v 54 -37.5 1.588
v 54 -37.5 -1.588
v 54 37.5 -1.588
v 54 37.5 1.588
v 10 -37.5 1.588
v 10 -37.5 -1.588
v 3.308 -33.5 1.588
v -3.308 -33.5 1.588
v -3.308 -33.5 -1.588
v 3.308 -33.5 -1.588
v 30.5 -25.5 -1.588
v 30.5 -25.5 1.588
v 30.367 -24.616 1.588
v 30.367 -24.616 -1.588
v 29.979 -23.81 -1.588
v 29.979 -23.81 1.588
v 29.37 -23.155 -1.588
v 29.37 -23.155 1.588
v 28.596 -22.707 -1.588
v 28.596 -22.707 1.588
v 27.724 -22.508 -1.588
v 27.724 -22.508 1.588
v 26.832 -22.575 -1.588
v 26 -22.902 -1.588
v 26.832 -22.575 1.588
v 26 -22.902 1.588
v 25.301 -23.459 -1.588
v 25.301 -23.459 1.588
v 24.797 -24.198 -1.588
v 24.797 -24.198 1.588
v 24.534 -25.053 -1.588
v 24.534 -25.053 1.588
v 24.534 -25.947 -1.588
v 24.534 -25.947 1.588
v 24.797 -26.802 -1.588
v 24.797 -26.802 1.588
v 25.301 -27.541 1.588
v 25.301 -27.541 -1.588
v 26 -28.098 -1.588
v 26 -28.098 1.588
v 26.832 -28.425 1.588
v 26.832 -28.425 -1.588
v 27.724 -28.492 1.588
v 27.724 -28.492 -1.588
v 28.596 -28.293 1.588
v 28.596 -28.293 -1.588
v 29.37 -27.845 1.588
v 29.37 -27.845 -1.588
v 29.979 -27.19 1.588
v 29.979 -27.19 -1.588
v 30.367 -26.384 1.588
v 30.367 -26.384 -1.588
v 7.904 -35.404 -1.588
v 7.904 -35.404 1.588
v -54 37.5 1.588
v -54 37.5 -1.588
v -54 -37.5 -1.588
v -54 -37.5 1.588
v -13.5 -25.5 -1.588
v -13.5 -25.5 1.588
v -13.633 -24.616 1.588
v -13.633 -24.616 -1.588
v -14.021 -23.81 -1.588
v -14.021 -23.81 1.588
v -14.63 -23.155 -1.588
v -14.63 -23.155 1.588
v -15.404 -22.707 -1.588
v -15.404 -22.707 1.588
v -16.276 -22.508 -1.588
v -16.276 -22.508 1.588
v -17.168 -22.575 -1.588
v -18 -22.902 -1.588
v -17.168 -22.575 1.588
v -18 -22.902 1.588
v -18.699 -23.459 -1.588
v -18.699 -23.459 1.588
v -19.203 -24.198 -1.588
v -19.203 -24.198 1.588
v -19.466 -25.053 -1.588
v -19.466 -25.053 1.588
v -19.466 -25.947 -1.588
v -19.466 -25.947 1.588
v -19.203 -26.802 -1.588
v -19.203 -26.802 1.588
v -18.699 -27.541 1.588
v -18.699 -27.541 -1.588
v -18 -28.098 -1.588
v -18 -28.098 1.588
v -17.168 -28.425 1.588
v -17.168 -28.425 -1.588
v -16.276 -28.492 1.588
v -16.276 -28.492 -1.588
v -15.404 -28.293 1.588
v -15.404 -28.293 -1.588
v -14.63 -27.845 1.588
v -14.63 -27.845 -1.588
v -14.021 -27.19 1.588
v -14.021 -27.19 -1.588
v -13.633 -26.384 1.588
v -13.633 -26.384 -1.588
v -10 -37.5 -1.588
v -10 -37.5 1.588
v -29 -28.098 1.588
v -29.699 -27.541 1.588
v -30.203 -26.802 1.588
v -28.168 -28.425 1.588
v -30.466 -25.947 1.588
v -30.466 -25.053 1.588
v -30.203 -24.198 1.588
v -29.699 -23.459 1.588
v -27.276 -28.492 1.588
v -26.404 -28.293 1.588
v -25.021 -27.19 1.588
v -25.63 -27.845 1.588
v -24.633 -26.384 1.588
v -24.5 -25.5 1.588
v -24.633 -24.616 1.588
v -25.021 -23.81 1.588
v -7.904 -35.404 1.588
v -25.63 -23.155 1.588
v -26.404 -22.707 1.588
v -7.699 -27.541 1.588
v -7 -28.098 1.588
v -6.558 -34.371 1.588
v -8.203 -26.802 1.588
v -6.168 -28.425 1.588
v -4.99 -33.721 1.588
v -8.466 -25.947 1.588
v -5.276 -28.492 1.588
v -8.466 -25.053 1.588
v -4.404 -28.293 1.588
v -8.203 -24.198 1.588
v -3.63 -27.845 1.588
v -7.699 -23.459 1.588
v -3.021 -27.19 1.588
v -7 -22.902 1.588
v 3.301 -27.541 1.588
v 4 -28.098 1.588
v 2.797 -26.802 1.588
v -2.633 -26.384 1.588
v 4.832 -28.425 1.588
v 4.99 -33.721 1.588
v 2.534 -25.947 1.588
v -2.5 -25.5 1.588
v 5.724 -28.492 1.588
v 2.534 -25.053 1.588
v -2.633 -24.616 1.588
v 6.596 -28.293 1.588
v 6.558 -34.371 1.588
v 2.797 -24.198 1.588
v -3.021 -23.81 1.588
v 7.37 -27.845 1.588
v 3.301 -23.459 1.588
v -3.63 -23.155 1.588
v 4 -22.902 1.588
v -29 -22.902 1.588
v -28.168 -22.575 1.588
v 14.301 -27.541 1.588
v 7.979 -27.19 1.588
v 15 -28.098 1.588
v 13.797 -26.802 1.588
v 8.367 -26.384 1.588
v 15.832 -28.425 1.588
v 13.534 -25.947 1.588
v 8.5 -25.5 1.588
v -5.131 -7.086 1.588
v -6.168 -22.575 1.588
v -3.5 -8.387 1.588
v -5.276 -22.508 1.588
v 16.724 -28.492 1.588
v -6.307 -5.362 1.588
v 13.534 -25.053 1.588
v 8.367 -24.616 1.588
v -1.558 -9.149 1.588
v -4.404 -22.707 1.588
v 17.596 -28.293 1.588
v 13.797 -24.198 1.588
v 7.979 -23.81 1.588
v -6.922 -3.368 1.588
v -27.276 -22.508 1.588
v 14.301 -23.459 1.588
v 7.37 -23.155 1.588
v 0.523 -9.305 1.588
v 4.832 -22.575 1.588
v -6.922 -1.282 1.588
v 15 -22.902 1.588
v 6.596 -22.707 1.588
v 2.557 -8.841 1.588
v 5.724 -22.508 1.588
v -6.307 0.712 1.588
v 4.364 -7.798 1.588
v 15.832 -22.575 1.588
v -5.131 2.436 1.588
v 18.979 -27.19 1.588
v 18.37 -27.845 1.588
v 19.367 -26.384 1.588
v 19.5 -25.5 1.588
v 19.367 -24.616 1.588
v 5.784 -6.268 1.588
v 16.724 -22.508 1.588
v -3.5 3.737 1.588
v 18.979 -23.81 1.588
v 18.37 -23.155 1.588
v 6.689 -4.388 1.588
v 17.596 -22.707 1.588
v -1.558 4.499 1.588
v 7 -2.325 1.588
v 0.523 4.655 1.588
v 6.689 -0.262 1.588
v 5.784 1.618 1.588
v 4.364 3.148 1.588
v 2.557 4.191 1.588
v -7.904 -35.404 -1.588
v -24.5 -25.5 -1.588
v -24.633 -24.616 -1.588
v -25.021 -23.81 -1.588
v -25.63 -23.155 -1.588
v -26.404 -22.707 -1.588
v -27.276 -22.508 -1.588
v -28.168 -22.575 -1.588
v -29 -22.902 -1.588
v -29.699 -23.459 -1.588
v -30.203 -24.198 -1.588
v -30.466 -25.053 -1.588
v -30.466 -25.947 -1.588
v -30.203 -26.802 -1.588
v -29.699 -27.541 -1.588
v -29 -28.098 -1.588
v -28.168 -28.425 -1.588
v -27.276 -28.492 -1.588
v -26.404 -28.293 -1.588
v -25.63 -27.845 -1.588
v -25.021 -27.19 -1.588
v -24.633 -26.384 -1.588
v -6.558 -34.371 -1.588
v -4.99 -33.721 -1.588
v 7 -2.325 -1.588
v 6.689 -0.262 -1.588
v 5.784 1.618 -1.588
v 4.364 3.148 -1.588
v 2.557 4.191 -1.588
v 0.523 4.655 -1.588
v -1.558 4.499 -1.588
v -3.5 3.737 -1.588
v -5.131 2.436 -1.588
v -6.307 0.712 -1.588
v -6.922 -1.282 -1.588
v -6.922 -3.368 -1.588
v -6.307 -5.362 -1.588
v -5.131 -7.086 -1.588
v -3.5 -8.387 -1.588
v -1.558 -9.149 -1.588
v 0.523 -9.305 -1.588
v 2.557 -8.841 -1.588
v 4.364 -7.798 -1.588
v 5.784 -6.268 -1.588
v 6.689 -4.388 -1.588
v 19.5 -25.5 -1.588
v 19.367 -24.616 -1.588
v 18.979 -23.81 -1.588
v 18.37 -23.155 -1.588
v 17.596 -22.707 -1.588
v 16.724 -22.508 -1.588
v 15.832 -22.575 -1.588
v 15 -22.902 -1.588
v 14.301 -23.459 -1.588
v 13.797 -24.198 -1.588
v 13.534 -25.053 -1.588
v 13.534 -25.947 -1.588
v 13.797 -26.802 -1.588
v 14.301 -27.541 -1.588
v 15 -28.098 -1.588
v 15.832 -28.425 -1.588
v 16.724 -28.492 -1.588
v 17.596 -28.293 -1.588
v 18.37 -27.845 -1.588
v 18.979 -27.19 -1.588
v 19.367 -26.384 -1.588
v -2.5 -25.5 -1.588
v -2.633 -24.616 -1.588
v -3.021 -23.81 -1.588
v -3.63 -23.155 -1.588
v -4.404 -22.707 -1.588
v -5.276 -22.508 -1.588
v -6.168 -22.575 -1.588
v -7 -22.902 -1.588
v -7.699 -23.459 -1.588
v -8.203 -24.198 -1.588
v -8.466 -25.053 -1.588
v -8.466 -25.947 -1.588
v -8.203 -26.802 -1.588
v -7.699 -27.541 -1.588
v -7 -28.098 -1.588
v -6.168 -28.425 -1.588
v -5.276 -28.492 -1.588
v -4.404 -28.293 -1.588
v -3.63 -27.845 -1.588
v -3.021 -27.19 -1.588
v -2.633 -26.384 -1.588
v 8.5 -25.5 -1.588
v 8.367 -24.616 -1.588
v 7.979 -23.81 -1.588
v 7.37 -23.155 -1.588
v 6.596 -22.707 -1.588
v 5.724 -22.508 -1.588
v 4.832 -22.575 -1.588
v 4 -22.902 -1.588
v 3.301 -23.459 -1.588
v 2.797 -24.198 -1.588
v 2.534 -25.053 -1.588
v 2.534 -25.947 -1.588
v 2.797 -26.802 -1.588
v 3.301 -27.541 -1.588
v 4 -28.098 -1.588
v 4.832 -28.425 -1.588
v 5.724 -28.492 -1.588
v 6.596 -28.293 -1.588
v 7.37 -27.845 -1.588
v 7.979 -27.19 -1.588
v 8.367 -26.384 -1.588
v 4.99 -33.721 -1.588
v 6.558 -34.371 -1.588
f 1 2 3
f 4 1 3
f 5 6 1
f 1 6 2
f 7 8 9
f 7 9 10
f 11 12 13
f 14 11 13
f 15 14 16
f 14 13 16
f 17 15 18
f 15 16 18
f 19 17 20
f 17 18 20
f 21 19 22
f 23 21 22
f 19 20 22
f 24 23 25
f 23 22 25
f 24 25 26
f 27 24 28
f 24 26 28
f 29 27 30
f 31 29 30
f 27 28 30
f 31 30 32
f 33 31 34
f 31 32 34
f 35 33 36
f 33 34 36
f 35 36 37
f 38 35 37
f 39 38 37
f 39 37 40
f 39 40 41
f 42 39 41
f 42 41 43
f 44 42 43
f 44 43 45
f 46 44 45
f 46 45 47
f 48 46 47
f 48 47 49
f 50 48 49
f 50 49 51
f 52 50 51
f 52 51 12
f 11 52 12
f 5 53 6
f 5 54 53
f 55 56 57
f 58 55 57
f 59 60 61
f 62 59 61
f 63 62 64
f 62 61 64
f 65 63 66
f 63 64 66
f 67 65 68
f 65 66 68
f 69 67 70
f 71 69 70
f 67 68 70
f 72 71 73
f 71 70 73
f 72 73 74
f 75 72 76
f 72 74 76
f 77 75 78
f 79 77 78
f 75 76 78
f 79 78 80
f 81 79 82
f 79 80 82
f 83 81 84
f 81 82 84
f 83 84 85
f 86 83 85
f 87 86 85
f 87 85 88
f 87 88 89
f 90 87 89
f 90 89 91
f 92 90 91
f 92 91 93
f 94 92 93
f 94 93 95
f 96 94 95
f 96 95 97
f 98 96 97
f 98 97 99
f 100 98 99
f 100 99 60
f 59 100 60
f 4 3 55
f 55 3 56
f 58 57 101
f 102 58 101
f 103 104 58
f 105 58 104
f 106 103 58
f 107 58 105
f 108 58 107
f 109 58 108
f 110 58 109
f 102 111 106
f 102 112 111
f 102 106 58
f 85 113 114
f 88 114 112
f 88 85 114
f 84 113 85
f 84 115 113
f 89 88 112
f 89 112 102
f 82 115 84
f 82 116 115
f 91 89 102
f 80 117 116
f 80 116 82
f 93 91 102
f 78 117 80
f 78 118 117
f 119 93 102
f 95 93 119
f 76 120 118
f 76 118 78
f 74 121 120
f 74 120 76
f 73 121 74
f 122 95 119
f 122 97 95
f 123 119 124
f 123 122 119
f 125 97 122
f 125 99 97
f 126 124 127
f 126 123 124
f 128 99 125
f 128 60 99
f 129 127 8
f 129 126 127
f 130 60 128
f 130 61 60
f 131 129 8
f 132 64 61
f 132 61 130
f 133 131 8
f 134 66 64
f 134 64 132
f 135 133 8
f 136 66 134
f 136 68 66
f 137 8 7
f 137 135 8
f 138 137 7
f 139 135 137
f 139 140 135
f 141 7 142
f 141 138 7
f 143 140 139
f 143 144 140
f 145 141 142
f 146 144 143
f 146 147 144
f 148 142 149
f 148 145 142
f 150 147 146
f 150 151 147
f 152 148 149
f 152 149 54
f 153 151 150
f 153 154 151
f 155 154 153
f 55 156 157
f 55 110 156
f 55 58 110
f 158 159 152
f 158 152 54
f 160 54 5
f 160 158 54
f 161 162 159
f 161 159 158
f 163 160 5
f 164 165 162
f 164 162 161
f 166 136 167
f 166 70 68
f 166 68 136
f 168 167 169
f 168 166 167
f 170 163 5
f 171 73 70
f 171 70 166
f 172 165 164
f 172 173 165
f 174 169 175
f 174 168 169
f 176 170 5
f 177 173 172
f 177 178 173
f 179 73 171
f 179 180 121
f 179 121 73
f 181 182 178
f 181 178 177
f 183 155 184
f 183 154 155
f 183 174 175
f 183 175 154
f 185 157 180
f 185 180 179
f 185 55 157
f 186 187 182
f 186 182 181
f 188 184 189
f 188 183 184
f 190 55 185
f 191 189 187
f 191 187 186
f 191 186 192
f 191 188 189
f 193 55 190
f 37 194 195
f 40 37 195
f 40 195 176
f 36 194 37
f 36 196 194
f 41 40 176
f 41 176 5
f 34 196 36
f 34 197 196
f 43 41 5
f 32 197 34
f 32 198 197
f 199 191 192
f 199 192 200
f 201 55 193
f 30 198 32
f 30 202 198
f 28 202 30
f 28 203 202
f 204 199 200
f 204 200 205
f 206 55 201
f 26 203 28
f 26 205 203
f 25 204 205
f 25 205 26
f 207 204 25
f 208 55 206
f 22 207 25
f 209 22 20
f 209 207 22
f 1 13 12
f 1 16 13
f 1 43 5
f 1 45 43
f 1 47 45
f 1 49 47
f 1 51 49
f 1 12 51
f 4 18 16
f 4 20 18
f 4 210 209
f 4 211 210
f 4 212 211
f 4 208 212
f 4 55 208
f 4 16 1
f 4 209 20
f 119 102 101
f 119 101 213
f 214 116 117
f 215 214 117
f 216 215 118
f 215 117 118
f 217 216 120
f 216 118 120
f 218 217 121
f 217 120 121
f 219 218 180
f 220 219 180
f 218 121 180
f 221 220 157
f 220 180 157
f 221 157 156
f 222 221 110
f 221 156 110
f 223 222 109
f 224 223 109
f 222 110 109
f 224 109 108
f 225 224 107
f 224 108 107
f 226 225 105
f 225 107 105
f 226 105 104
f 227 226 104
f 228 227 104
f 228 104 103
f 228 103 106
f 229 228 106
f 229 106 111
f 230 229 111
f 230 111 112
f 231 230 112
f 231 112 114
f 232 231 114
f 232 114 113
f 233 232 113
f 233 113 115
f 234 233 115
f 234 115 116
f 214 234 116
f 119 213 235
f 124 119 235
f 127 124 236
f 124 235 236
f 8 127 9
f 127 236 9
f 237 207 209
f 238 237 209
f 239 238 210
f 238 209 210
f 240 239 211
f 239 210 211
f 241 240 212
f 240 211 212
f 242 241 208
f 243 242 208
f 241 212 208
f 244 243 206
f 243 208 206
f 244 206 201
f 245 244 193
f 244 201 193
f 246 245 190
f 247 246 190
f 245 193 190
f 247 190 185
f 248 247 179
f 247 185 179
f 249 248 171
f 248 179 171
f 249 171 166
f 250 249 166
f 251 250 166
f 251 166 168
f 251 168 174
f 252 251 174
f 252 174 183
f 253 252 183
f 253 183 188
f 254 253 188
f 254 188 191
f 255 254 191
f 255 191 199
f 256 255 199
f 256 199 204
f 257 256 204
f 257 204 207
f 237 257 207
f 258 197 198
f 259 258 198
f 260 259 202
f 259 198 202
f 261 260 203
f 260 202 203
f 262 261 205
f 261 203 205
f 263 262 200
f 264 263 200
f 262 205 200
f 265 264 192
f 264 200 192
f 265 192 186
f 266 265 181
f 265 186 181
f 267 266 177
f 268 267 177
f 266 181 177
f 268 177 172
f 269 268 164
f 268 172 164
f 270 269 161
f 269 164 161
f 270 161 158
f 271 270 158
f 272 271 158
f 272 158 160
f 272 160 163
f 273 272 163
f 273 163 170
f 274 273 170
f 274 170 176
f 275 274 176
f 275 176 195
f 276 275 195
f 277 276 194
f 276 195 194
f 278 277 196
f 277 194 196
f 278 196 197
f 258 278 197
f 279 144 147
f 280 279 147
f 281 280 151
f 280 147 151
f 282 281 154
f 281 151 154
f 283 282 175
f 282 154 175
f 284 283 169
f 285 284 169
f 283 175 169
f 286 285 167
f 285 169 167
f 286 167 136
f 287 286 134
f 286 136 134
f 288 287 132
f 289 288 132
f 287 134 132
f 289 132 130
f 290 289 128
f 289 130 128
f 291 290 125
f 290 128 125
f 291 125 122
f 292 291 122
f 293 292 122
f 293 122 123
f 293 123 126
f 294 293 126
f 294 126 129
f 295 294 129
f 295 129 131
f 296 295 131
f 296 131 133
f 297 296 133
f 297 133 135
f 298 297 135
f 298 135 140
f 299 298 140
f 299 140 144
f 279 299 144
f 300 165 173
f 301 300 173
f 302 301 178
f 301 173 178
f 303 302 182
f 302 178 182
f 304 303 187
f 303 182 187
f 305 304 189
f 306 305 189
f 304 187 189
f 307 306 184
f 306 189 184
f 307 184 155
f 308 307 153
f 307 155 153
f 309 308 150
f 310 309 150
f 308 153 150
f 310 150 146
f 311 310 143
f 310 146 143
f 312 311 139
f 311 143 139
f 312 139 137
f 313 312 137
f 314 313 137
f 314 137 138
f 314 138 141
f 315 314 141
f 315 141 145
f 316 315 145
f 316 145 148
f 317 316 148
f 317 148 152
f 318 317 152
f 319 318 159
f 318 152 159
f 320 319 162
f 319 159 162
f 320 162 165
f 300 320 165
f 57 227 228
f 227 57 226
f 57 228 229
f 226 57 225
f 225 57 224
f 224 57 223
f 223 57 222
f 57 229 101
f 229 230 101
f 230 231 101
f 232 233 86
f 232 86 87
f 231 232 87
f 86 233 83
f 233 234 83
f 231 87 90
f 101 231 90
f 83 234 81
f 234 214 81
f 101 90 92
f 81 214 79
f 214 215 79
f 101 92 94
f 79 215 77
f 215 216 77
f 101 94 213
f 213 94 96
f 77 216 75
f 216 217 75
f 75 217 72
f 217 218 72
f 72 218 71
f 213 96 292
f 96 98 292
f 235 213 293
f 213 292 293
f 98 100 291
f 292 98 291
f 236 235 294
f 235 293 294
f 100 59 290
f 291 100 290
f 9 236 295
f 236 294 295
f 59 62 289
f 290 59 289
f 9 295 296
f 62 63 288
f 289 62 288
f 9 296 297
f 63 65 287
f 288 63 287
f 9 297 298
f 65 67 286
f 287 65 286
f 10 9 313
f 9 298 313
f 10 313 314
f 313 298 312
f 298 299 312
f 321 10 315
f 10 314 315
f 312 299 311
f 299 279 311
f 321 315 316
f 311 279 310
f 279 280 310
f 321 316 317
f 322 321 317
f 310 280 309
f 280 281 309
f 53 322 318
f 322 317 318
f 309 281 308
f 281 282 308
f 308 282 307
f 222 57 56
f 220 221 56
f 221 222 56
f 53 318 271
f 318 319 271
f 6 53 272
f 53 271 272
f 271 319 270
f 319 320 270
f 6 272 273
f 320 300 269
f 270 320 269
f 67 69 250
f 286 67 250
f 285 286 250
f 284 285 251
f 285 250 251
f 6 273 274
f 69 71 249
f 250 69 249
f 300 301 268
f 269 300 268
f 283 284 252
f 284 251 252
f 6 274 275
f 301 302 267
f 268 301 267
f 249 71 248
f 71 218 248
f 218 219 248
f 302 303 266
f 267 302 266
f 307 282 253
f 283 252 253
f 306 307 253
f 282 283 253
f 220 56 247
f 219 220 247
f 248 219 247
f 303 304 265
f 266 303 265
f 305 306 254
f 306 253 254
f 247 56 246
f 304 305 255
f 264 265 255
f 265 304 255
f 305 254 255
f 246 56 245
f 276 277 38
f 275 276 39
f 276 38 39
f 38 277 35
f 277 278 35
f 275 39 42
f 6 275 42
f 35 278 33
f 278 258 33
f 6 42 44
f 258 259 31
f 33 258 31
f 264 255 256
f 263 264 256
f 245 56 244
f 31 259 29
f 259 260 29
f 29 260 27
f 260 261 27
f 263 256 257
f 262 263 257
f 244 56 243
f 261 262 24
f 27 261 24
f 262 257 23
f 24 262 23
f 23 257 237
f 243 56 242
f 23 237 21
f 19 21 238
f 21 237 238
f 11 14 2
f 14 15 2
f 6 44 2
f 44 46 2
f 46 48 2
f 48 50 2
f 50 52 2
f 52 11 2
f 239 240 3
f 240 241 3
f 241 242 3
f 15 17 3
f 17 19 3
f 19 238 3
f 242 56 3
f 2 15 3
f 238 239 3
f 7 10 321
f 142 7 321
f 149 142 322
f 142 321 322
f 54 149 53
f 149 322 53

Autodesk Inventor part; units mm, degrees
ref_plane "YZ Plane" through (0, 0, 0) normal (1, 0, 0) x (0, 1, 0)
ref_plane "XZ Plane" through (0, 0, 0) normal (0, 1, 0) x (-1, 0, 0)
ref_plane "XY Plane" through (0, 0, 0) normal (0, 0, 1) x (1, 0, 0)
sketch "Sketch1" plane through (0, 0, 0) normal (0, 0, 1) x (1, 0, 0)
  line L0 (-54, -37.5) -> (54, -37.5)
  line L1 (54, -37.5) -> (54, 37.5)
  line L2 (54, 37.5) -> (-54, 37.5)
  line L3 (-54, 37.5) -> (-54, -37.5)
  line L4 (-54, -37.5) -> (54, 37.5) construction
  line L5 (54, -37.5) -> (-54, 37.5) construction
  point P0 (0, 0)
  dimension "d0" = 108
  dimension "d1" = 75
extrude "Extrusion1" add sketch "Sketch1" along normal mid plane 3.175
sketch "Sketch3" plane through (0, 0, 1.5875) normal (0, 0, 1) x (1, 0, 0)
  line L0 (-54, -37.5) -> (54, -37.5) construction
  line L1 (-10, -37.5) -> (-6, -33.5)
  line L2 (-6, -33.5) -> (6, -33.5)
  line L3 (6, -33.5) -> (10, -37.5)
  line L4 (-10, -37.5) -> (10, -37.5)
  point P0 (0, 0)
  point P1 (0, -33.5)
  point P2 (0, -37.5)
  dimension "d16" = 12
  dimension "d17" = 4
  dimension "d18" = 45
extrude "Extrusion3" cut sketch "Sketch3" against normal through all
fillet "Fillet1" radius 6.5 2 edges at (-6, -33.5, 0) (6, -33.5, 0)
sketch "Sketch4" plane through (0, 0, 1.5875) normal (0, 0, 1) x (1, 0, 0)
  circle A0 centre (0, -2.325) radius 7
  line L0 (10, -37.5) -> (54, -37.5) construction
  point P0 (0, 0)
  dimension "d22" = 14
  dimension "d23" = 35.175
extrude "Extrusion4" cut sketch "Sketch4" against normal through all
sketch "Sketch5" plane through (0, 0, 1.5875) normal (0, 0, 1) x (1, 0, 0)
  circle A0 centre (-27.5, -25.5) radius 3
  line L0 (-54, -37.5) -> (-10, -37.5) construction
  circle A1 centre (-16.5, -25.5) radius 3
  circle A2 centre (-5.5, -25.5) radius 3
  circle A3 centre (5.5, -25.5) radius 3
  circle A4 centre (16.5, -25.5) radius 3
  circle A5 centre (27.5, -25.5) radius 3
  line L1 (-5.5, -25.5) -> (5.5, -25.5) construction
  point P0 (0, 0)
  point P1 (0, -25.5)
  dimension "d26" = 6
  dimension "d27" = 12
  dimension "d30" = 11
extrude "Extrusion5" cut sketch "Sketch5" against normal blind 10
properties part number "ArmSupportPlate"
